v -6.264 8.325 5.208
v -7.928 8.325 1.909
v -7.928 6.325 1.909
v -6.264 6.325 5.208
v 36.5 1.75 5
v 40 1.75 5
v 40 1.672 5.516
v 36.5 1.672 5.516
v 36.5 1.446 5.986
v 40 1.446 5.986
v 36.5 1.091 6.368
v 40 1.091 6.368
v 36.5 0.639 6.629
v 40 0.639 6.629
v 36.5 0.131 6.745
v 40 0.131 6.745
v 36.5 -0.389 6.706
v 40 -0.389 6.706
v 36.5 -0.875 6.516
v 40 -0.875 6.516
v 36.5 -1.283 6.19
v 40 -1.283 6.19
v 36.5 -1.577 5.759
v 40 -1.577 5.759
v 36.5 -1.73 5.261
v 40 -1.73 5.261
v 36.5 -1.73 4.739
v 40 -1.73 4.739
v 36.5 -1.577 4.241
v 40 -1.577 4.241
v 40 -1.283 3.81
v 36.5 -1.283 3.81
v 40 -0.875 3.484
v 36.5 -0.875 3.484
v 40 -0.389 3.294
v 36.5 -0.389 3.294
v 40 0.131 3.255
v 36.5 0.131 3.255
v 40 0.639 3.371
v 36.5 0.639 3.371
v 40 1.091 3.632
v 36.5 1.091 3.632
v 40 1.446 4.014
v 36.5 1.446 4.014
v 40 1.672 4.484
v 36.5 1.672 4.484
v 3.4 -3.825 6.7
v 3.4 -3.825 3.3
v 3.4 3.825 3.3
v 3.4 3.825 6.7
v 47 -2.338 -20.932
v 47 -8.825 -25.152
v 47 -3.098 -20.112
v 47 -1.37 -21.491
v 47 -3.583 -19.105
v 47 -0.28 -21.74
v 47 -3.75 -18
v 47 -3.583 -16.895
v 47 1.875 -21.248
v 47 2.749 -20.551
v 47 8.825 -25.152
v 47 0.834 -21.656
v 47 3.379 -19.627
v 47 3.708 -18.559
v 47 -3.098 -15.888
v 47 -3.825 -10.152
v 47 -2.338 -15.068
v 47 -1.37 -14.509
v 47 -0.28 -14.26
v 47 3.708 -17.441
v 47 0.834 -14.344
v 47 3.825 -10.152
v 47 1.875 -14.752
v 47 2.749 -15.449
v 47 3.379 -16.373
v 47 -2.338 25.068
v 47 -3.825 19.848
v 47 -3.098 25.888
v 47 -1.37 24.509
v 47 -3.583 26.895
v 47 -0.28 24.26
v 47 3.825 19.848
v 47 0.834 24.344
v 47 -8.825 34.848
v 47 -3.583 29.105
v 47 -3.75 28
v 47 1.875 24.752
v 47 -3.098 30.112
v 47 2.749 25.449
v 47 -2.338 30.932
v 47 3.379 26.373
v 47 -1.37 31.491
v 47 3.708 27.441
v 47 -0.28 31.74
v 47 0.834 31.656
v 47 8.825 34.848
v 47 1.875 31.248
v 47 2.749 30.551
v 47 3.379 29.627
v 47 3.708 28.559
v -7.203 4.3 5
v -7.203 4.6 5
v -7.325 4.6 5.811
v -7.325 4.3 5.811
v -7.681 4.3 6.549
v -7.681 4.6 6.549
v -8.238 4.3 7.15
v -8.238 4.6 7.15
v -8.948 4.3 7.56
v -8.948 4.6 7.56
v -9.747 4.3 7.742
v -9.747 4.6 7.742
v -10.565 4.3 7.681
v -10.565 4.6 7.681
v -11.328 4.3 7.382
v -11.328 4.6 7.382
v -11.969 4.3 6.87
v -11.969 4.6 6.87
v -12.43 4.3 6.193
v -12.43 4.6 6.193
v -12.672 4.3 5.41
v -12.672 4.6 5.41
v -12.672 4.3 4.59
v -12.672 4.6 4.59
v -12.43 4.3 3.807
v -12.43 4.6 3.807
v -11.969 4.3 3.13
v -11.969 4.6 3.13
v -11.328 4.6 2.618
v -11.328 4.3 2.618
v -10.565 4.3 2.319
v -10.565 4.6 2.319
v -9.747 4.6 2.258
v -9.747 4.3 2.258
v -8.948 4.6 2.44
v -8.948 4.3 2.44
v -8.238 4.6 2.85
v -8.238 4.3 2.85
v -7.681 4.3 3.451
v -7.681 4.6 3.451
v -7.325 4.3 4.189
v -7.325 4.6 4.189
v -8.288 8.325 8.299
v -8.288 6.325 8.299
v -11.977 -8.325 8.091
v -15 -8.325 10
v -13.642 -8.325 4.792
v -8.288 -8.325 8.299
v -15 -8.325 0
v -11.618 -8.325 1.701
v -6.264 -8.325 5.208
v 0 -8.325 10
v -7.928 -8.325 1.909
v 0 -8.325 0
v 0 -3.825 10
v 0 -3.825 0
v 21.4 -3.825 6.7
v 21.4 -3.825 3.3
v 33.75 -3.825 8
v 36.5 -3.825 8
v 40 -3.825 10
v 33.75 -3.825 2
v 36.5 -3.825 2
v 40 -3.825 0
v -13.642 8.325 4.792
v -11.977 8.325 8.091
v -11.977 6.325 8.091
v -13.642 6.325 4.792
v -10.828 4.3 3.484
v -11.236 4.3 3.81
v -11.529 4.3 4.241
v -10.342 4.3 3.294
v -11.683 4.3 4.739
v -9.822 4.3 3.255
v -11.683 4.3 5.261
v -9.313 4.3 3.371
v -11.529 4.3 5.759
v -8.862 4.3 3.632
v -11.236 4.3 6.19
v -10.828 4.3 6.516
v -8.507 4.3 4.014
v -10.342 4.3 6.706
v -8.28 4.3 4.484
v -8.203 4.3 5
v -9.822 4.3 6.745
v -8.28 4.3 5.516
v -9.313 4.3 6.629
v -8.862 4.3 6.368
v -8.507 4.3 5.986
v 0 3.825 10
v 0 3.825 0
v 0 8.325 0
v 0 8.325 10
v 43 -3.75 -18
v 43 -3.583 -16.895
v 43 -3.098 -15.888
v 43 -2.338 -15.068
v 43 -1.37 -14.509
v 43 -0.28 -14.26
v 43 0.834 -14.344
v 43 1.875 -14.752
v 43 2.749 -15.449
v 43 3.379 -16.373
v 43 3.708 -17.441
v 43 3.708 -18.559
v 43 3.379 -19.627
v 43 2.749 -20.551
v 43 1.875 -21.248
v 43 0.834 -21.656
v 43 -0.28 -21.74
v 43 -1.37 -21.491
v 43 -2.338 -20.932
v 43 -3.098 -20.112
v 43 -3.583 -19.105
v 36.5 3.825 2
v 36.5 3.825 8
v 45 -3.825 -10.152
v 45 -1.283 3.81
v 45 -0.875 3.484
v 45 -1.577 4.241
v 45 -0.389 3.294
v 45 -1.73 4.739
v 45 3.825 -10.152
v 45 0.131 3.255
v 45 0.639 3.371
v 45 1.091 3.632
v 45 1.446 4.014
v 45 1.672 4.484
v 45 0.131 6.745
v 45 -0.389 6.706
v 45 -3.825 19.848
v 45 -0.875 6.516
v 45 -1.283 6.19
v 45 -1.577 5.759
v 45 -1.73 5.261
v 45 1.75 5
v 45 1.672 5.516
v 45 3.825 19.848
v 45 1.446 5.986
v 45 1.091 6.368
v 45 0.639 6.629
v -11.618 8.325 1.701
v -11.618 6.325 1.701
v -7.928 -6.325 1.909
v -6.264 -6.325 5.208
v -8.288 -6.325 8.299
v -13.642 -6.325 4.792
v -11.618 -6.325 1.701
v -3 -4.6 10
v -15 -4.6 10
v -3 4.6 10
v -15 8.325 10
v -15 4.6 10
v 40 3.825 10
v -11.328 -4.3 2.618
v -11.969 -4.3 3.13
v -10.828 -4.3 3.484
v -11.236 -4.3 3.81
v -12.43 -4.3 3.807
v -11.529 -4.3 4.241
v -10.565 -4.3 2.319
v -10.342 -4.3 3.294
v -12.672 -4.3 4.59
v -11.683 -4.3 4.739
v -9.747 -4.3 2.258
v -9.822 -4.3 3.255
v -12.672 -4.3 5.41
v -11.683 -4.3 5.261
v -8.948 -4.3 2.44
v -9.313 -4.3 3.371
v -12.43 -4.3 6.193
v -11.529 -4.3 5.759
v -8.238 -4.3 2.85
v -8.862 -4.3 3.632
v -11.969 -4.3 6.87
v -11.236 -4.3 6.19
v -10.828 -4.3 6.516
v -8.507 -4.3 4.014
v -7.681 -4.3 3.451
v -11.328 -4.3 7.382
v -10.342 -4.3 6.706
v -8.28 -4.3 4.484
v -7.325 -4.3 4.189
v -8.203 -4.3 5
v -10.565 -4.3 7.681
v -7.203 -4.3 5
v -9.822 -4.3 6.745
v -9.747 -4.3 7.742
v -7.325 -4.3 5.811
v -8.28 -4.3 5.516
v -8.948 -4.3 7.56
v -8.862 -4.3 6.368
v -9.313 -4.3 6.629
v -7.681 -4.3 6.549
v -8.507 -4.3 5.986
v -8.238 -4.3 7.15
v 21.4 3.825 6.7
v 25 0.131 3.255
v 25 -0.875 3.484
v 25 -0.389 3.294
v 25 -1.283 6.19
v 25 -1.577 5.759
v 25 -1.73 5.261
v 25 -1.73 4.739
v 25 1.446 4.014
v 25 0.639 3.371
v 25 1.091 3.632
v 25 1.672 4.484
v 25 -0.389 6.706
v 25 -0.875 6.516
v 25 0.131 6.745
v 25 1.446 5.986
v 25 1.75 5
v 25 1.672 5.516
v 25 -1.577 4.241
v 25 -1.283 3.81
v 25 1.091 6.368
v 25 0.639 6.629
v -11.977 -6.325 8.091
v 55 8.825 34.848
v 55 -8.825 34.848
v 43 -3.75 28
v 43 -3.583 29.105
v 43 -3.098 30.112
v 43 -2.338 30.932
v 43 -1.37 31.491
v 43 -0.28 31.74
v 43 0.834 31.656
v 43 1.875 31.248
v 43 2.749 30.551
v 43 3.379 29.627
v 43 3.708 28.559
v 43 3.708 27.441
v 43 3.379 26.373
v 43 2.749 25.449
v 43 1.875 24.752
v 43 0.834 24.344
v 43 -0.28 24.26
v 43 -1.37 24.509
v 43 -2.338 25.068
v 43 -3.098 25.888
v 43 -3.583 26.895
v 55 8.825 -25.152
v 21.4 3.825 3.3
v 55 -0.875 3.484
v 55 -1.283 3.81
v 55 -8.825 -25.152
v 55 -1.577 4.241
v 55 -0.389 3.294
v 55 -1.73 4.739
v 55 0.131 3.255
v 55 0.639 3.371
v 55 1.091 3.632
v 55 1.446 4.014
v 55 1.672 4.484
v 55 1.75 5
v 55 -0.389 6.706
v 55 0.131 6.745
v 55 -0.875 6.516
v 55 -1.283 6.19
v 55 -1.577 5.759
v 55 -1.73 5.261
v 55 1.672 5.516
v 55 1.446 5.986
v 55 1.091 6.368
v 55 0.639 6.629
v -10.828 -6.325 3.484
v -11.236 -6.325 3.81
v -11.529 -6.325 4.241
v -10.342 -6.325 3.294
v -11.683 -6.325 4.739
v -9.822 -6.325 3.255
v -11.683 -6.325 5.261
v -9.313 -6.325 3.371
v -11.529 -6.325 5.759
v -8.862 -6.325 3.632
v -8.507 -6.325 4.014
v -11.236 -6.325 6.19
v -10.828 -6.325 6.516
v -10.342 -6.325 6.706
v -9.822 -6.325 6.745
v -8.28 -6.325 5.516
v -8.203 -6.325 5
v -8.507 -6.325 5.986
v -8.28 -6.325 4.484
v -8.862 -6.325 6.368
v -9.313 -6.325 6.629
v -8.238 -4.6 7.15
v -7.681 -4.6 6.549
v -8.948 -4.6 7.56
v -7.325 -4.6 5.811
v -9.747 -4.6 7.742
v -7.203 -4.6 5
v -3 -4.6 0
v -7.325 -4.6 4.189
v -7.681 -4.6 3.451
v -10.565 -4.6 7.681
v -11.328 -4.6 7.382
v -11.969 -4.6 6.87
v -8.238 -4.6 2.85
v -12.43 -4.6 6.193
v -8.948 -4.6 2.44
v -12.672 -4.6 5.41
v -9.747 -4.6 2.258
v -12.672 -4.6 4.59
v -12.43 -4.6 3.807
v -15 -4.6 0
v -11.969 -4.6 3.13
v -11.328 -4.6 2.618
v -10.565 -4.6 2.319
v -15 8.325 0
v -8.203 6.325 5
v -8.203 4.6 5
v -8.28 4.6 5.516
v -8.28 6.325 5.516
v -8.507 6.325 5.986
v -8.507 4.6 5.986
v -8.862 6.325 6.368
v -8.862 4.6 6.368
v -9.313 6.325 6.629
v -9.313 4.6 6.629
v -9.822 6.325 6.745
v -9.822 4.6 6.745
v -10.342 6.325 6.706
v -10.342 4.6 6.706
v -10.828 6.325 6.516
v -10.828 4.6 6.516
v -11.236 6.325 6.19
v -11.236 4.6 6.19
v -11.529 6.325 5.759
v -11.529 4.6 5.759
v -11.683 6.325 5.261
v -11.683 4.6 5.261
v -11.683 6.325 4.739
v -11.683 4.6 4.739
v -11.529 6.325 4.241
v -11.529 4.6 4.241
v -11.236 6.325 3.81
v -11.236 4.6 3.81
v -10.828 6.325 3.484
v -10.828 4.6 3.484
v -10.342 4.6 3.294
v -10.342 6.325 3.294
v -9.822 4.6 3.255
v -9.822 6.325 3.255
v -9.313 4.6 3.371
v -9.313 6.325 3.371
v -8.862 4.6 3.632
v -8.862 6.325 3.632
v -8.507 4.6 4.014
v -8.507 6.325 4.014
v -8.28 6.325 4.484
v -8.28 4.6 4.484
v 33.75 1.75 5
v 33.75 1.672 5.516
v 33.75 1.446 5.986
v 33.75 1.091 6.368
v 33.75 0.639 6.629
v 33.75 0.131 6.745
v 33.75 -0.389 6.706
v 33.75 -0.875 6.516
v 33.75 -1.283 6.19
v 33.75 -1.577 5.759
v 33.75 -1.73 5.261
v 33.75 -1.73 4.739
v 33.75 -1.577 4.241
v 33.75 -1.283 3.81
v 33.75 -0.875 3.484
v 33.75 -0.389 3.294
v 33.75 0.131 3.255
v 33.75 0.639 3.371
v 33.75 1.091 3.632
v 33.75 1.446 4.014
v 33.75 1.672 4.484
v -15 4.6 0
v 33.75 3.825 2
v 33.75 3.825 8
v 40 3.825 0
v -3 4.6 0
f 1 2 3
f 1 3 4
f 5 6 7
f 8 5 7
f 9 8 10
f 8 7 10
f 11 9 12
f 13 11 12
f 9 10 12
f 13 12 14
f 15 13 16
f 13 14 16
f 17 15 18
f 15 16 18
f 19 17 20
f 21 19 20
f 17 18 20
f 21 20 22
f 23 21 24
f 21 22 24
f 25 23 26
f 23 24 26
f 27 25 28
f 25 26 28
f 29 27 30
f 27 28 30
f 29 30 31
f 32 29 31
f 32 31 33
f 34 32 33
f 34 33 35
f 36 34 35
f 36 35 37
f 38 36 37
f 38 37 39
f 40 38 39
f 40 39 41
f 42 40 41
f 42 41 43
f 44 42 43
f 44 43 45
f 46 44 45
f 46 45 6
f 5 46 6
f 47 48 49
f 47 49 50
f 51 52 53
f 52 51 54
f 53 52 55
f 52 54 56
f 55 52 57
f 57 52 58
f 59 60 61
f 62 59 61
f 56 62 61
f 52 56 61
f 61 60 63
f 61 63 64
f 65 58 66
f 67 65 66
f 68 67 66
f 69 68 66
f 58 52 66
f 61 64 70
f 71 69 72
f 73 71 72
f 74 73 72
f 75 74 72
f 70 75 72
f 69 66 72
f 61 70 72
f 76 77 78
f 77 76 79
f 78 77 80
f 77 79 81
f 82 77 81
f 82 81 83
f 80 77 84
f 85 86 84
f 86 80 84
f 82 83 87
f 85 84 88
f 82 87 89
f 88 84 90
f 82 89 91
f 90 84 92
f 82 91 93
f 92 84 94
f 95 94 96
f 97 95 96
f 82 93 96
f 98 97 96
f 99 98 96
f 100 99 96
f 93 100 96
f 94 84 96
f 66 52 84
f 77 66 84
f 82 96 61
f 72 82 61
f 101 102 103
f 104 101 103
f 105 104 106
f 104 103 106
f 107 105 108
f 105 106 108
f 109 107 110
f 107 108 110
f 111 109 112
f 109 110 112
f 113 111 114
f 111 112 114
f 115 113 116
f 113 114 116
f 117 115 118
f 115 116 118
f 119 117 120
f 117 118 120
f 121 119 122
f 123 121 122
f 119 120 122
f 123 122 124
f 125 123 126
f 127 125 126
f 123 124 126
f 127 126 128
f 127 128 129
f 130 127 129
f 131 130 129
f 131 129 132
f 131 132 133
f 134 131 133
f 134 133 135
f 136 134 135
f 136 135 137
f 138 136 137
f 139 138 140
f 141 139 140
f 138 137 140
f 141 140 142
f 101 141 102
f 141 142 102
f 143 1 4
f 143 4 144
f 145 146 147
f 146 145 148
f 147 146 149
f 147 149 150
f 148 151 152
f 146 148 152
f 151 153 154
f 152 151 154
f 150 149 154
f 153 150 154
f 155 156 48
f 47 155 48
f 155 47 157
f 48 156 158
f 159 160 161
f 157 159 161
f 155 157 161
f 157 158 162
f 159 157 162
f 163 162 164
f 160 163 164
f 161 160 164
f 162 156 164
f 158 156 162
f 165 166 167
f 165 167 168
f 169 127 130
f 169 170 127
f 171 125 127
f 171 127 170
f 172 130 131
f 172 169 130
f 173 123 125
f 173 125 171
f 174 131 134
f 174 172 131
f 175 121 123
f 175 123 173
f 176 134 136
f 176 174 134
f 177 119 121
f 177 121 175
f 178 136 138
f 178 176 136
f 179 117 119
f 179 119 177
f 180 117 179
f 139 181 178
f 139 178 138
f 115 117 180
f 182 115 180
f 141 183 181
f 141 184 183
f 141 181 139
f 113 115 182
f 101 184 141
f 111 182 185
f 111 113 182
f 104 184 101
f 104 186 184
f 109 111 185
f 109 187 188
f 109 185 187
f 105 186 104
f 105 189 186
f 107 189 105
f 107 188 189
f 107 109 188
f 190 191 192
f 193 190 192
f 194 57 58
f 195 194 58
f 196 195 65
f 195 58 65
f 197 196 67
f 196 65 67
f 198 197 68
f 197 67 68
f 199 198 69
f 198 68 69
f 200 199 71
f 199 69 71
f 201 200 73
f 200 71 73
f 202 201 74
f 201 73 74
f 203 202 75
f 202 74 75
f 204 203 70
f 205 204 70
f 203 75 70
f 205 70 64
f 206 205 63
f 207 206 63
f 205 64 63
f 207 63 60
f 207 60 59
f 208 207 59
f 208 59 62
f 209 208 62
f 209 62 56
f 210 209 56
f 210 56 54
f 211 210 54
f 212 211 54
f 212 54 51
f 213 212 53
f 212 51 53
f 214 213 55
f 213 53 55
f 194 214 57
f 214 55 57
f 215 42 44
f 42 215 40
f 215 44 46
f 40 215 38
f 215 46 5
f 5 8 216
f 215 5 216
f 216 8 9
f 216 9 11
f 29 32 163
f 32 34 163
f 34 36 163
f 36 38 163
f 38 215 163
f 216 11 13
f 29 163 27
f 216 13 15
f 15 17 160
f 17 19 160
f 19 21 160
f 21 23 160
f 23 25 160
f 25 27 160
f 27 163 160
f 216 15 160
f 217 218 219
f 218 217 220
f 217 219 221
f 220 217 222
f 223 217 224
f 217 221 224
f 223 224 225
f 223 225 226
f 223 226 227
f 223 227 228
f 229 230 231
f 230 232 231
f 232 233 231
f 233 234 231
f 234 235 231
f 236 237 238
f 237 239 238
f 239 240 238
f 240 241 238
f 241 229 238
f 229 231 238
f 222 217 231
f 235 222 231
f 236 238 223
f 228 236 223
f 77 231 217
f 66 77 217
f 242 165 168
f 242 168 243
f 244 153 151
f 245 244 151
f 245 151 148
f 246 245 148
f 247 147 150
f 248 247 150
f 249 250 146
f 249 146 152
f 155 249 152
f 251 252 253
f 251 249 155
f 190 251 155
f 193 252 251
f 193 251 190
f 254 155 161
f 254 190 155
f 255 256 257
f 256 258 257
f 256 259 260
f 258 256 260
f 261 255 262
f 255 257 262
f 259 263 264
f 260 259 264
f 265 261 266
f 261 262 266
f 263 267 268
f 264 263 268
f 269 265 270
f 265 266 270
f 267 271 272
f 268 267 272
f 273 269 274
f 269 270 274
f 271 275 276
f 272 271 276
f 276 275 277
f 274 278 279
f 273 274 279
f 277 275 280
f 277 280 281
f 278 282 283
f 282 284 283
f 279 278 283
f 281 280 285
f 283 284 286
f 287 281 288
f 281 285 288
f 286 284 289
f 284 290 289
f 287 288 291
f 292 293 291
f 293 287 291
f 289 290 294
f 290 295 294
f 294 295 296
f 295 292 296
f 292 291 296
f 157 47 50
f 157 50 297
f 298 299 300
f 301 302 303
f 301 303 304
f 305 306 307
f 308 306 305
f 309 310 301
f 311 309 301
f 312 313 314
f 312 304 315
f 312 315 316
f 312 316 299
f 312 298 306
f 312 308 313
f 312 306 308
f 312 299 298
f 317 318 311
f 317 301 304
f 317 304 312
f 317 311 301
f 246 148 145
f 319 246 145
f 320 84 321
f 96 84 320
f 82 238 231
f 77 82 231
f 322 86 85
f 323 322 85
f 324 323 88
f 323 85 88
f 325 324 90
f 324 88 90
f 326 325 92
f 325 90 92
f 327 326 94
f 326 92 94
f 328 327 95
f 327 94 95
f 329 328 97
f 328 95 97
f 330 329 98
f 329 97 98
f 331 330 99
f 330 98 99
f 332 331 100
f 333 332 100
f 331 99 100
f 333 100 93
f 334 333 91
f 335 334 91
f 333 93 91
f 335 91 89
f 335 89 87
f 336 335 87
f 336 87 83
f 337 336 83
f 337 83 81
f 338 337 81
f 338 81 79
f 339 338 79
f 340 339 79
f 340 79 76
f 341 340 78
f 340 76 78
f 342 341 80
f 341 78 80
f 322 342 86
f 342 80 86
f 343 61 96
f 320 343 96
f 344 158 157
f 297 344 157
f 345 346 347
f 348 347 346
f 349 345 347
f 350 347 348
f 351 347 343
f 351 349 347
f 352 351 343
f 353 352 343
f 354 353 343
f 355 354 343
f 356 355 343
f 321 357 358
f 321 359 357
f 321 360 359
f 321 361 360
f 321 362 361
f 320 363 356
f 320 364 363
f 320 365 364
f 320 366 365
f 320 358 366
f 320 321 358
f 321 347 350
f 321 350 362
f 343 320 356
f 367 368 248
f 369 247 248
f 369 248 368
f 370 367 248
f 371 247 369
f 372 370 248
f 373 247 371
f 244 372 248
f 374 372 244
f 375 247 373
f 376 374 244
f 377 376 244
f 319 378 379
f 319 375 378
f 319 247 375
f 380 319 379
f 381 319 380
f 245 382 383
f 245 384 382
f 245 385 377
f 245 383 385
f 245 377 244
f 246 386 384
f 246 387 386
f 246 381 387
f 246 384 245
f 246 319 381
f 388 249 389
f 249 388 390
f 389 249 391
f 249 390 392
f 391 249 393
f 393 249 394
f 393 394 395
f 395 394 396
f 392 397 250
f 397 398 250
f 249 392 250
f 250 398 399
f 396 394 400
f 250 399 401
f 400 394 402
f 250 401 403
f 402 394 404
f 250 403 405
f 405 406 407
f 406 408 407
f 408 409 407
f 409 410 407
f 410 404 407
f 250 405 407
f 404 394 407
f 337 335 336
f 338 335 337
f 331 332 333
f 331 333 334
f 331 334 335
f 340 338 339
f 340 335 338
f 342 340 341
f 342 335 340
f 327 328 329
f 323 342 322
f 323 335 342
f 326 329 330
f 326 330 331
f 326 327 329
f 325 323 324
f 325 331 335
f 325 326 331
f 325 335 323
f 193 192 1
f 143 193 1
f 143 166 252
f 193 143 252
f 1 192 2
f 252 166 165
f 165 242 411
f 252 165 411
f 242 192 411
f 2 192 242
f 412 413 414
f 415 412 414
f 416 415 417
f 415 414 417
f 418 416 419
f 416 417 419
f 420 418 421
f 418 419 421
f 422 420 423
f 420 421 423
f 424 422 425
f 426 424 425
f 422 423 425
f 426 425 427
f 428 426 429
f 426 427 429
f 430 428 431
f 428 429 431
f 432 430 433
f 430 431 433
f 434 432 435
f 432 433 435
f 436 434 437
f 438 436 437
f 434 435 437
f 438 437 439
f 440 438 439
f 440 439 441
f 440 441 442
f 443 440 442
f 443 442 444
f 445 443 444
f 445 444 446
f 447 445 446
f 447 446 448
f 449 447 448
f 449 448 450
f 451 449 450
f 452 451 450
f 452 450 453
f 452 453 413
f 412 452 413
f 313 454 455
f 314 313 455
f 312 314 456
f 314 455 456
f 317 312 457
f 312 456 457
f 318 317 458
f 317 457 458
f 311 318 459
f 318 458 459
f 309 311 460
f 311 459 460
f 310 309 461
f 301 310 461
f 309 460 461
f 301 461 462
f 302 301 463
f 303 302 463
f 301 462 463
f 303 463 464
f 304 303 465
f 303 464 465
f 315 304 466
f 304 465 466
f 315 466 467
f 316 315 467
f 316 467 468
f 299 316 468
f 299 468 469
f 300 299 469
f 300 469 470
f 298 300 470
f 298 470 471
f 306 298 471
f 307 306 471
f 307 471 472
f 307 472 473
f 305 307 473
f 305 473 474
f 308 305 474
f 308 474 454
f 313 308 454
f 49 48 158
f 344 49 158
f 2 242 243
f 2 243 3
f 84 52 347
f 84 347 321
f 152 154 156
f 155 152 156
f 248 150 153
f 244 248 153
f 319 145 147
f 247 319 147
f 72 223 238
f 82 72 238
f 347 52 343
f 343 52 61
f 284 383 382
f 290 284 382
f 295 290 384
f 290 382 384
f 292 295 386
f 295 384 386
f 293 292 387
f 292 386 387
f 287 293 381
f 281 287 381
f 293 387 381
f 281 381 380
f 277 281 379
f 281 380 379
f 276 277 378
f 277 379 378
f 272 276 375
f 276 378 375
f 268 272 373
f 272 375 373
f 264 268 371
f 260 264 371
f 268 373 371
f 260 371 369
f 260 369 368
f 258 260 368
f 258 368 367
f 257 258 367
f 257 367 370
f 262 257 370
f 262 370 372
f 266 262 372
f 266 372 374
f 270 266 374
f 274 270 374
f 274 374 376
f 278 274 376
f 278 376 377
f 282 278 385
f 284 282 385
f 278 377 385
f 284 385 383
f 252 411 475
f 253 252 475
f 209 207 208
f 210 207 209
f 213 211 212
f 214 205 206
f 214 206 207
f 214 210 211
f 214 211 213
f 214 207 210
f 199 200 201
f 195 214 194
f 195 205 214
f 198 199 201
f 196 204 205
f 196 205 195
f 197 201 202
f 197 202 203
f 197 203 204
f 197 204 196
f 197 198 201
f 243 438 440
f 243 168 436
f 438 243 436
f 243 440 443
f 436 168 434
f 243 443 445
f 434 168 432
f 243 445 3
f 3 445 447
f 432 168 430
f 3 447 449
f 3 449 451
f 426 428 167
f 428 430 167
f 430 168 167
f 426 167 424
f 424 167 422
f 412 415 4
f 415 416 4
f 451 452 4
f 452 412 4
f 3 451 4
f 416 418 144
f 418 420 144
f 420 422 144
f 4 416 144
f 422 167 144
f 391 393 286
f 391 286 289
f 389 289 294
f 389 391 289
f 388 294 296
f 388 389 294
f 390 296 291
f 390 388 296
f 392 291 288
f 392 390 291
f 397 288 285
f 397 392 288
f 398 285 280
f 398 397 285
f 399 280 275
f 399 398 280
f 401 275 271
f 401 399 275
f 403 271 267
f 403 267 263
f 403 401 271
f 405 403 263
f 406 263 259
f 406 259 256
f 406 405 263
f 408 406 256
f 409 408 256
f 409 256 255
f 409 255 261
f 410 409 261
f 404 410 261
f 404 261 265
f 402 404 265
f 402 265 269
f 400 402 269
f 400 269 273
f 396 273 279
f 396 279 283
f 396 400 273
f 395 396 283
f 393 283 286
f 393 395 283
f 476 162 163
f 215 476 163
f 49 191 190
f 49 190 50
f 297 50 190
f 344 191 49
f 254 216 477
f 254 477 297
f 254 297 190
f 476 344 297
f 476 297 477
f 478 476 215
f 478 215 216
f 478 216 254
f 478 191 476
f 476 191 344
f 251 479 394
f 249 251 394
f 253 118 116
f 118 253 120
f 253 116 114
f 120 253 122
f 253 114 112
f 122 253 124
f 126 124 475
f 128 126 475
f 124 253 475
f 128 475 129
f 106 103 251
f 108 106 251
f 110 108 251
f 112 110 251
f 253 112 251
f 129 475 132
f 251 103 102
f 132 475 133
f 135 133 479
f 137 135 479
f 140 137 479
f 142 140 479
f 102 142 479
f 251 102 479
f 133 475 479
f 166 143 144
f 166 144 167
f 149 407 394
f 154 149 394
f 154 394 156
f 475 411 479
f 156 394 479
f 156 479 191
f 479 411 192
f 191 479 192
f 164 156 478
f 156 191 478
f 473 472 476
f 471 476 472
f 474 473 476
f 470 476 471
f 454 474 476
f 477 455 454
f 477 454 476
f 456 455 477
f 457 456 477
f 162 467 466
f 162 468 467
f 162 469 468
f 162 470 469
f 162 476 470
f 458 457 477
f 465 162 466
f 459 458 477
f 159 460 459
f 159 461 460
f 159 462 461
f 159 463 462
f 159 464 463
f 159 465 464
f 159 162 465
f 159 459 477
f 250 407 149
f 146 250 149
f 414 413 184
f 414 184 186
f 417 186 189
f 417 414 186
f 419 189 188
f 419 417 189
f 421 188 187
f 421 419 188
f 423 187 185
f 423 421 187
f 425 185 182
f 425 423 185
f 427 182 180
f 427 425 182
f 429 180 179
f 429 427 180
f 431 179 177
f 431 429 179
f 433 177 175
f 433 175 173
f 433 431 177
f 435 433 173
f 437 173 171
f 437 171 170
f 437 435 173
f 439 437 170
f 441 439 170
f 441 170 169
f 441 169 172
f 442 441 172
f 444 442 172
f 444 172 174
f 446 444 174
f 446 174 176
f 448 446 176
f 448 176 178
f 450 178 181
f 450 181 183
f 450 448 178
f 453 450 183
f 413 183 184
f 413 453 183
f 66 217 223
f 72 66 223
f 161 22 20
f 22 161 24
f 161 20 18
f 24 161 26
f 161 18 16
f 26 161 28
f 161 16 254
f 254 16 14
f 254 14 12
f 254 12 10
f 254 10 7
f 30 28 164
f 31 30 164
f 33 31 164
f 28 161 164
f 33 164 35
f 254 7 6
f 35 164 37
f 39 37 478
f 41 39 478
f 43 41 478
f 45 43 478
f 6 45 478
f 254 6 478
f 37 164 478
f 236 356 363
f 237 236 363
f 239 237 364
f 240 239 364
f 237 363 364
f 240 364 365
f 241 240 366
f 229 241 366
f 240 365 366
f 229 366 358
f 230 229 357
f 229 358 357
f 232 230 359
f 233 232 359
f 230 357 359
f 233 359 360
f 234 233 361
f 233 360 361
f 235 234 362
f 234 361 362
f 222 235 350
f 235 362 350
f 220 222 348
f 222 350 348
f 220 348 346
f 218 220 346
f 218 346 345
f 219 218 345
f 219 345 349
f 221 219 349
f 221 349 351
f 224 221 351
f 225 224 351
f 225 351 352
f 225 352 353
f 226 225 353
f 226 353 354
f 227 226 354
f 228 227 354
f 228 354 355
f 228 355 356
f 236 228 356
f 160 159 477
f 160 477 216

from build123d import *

# Parameters (mm, degrees)
F0_W      = 40
F0_H      = 3.825
F1_DEPTH  = 10
F2_R      = 1.75
F3_DEPTH  = 16.651
F4_W      = 18
F4_H      = 3.4
F4_W_2    = 2.75
F4_H_2    = 6
F5_DEPTH  = 12.151
F6_R      = 1.75
F7_DEPTH  = 15
F10_DEPTH = 2
F11_W     = 17.65
F11_H     = 60
F12_DEPTH = 8
F13_R     = 1.75
F14_DEPTH = 70.001
F15_R     = 2.75
F15_R_2   = 1.75
F16_DEPTH = 0.3
F17_R     = 1.75
F18_DEPTH = 2
F19_R     = 3.75
F20_DEPTH = 4


# Not quite as in the source:
# - a pattern or mirror of a feature is missing from the dataset's text; its kind, count and spacing are read off the source's solid


with BuildPart() as f1:
    # F0 (on Top) → F1 (new body)
    with BuildSketch(Plane.XY):
        Polygon((0, -3.825), (0, 0), (-3, 0), (-3, -4.6), (-15, -4.6), (-15, -8.325), (0, -8.325), align=None)
        Polygon((-3, 0), (0, 0), (0, 3.825), (0, 8.325), (-15, 8.325), (-15, 4.6), (-3, 4.6), align=None)
        with Locations((20, 1.9125)):
            Rectangle(F0_W, F0_H)
        with Locations((20, -1.9125)):
            Rectangle(F0_W, F0_H)
    extrude(amount=F1_DEPTH)

    # F2 (on face) → F3 (cut, through all)
    with BuildSketch(Plane.XZ.offset(8.325)):
        with Locations((-9.9527407438, 5)):
            Circle(F2_R)
    extrude(amount=-F3_DEPTH, mode=Mode.SUBTRACT)

    # F4 (on face) → F5 (cut, through all)
    with BuildSketch(Plane.XZ.offset(3.825)):
        with Locations((12.4002694301, 5)):
            Rectangle(F4_W, F4_H)
        with Locations((35.125, 5)):
            Rectangle(F4_W_2, F4_H_2)
    extrude(amount=-F5_DEPTH, mode=Mode.SUBTRACT)

    # F6 (on face) → F7 (cut)
    with BuildSketch(Plane.YZ.offset(40)):
        with Locations((0, 5)):
            Circle(F6_R)
    extrude(amount=-F7_DEPTH, mode=Mode.SUBTRACT)

    # F15 (on face) → F16 (join)
    with BuildSketch(Plane.XZ.offset(-4.6)):
        with Locations((-9.9527407438, 5)):
            Circle(F15_R)
        with Locations((-9.9527407438, 5)):
            Circle(F15_R_2, mode=Mode.SUBTRACT)
    f16 = extrude(amount=F16_DEPTH)

    # F16_copies: F16 across plane
    add(f16.mirror(Plane(origin=(0, 0, 0), x_dir=(0, 0, -1), z_dir=(0, -1, 0))))

    # F17 (on face) → F18 (cut)
    with BuildSketch(Plane.XZ.offset(8.325)):
        Polygon((-7.9284293953, 1.9088033227), (-6.2635302189, 5.2075067143), (-8.2878415673, 8.2987033916), (-11.9770520922, 8.0911966773), (-13.6419512686, 4.7924932857), (-11.6176399202, 1.7012966084), align=None)
        with Locations((-9.9527407438, 5)):
            Circle(F17_R, mode=Mode.SUBTRACT)
    f18 = extrude(amount=-F18_DEPTH, mode=Mode.SUBTRACT)

    # F18_copies: F18 across plane
    add(f18.mirror(Plane.ZX), mode=Mode.SUBTRACT)


with BuildPart() as f10:
    # F9 (on offset) → F10 (new body)
    with BuildSketch(Plane.YZ.offset(45)):
        Polygon((3.825, 0), (3.825, 10), (3.825, 19.8484882712), (-3.825, 19.8484882712), (-3.825, 10), (-3.825, 0), (-3.825, -10.1515117288), (3.825, -10.1515117288), align=None)
    extrude(amount=F10_DEPTH)

    # F11 (on face) → F12 (join)
    with BuildSketch(Plane.YZ.offset(47)):
        with Locations((0, 4.8484882712)):
            Rectangle(F11_W, F11_H)
    extrude(amount=F12_DEPTH)

    # F13 (on face) → F14 (cut, through all)
    with BuildSketch(Plane.YZ.offset(55)):
        with Locations((0, 5)):
            Circle(F13_R)
    extrude(amount=-F14_DEPTH, mode=Mode.SUBTRACT)

    # F19 (on face) → F20 (join)
    with BuildSketch(Plane(origin=(47, 0, 0), x_dir=(0, -1, 0), z_dir=(-1, 0, 0))):
        with Locations((0, 28)):
            Circle(F19_R)
        with Locations((0, -18)):
            Circle(F19_R)
    extrude(amount=F20_DEPTH)


solid = Compound([f1.part, f10.part])
